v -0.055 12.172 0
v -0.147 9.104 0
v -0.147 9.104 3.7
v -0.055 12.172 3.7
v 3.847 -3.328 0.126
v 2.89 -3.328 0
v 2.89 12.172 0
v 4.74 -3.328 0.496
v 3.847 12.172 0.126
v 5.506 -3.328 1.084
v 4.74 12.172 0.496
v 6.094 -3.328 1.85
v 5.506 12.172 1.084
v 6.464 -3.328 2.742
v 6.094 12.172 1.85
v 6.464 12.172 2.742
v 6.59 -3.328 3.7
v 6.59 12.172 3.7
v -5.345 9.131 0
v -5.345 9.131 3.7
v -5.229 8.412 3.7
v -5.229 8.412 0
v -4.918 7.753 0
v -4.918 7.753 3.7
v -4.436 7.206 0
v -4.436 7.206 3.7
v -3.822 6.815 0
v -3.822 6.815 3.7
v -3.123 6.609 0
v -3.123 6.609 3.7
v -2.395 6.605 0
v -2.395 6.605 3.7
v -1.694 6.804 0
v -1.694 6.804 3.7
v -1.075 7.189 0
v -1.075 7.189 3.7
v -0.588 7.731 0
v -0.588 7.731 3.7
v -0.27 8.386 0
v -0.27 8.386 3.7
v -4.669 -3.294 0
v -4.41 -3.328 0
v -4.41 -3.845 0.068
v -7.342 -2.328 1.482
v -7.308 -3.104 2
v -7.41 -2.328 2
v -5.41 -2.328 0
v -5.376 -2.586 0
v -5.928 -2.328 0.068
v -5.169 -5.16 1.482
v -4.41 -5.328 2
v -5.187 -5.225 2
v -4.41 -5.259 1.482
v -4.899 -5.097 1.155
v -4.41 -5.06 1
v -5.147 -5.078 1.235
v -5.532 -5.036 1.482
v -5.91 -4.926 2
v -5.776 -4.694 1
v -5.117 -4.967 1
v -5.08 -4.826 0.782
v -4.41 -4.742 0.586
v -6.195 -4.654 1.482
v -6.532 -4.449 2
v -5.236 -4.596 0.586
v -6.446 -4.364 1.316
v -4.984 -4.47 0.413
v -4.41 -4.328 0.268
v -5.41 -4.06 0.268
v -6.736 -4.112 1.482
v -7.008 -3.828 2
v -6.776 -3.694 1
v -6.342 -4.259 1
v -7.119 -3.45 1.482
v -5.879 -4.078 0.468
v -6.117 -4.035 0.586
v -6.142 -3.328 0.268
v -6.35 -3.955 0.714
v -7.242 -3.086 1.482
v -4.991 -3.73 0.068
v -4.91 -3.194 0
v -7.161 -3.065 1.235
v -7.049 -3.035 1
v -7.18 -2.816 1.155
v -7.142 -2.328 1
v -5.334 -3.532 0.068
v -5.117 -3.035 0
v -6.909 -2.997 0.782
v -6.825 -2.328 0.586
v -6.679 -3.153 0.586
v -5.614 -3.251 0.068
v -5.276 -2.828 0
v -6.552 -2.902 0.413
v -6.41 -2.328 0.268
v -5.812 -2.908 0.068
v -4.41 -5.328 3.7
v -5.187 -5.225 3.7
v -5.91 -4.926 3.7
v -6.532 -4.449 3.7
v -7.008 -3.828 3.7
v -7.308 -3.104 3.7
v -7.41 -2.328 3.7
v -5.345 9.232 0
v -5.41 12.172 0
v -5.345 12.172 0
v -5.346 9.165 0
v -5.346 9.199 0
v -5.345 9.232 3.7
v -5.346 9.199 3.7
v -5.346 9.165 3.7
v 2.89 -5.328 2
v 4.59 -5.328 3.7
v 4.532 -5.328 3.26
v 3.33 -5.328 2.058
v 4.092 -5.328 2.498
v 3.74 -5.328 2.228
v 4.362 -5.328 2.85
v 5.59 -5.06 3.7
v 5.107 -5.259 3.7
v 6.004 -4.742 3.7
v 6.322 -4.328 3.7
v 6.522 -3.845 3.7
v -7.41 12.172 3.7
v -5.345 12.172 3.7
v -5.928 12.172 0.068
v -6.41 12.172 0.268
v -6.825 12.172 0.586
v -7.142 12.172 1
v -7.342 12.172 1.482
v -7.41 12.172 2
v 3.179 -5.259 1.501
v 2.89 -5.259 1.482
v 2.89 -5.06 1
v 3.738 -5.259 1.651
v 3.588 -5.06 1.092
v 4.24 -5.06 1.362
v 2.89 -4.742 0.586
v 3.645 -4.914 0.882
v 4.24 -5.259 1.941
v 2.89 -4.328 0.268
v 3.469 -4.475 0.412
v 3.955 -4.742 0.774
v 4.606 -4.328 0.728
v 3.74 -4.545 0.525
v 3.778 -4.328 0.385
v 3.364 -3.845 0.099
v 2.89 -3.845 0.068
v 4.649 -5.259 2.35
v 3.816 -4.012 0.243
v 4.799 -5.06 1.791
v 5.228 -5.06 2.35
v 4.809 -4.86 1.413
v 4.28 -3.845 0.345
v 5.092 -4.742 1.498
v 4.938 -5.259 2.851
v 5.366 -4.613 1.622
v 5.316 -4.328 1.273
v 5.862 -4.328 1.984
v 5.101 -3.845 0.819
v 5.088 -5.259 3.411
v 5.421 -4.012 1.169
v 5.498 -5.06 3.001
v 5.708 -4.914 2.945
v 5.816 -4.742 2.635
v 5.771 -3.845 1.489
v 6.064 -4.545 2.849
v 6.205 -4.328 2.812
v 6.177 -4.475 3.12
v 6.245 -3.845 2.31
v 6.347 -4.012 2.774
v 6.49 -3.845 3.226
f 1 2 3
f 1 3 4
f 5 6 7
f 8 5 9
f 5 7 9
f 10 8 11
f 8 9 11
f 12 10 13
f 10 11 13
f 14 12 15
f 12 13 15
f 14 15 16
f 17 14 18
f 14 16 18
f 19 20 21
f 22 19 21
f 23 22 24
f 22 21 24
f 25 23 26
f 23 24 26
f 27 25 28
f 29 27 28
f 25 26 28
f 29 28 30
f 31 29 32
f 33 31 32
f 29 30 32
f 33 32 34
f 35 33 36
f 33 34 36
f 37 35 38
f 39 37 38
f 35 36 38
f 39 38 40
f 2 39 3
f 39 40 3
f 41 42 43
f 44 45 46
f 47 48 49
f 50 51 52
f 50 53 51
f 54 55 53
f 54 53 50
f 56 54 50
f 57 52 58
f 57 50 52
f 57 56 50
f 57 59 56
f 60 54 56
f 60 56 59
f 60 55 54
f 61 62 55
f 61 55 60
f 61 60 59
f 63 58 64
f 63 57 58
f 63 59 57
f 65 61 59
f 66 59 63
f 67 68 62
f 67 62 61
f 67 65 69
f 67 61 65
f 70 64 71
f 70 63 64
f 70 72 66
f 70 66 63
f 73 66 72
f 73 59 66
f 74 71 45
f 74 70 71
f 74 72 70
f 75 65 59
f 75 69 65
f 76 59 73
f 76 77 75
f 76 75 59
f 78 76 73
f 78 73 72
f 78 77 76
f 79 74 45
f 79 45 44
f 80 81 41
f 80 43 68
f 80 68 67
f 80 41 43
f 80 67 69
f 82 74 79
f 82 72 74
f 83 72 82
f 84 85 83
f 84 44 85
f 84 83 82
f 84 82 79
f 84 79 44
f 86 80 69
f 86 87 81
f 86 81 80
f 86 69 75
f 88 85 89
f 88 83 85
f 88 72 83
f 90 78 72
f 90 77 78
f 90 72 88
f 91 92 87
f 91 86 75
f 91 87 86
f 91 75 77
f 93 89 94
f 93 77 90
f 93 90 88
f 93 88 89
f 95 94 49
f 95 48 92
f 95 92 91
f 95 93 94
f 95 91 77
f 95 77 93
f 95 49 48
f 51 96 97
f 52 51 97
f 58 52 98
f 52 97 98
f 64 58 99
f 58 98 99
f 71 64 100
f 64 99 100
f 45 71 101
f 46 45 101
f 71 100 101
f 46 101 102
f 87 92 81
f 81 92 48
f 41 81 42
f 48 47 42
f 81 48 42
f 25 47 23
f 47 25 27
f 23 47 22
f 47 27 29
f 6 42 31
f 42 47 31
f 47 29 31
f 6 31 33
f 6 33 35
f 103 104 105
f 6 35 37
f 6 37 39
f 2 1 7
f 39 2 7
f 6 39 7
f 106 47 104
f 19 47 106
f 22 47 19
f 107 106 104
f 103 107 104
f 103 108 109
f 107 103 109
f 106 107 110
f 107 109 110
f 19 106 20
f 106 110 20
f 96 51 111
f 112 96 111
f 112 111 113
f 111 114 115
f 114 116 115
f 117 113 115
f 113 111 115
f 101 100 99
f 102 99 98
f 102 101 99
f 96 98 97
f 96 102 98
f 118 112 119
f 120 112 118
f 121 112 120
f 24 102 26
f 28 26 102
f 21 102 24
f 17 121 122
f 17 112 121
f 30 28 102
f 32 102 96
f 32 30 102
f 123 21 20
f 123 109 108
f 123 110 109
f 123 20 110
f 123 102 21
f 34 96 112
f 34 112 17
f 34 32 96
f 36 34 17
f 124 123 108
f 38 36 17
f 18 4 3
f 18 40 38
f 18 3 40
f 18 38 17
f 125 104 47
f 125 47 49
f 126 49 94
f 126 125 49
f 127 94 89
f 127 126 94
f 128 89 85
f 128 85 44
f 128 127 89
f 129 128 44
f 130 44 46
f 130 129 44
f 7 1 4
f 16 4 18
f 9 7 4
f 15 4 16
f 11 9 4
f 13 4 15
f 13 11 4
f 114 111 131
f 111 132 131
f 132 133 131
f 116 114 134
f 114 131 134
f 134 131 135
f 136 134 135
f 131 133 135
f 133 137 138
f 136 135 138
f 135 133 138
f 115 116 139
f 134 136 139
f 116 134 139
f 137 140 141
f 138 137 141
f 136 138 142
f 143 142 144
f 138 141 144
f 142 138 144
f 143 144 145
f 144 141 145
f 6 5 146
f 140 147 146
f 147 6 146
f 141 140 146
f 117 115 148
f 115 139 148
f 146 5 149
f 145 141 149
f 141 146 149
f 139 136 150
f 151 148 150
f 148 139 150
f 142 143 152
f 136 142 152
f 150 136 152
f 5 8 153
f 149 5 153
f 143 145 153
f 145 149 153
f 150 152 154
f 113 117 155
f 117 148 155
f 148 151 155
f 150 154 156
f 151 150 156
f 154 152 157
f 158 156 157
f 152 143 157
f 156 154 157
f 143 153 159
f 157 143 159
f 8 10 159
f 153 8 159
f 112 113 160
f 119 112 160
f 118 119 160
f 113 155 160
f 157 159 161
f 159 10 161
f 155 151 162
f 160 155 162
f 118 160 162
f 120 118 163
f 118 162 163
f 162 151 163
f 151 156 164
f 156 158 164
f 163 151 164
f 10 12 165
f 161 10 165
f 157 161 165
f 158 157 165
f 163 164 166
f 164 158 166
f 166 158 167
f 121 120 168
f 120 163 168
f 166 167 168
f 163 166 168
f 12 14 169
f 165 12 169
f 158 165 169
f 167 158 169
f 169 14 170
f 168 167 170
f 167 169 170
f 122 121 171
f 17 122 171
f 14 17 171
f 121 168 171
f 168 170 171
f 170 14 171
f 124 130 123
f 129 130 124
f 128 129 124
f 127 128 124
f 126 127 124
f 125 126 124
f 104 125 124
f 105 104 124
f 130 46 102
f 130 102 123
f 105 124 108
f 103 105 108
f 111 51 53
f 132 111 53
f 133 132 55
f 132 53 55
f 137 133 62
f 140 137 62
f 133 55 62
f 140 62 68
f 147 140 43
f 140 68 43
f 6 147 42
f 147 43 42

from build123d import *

# Parameters (mm, degrees)
F0_W         = 14
F0_H         = 17.5
F1_DEPTH     = 3.7
F3_DEPTH     = 5.4
F4_R         = 3.69999
F5_R         = 3
F6_T1_DEPTH  = 7.30001
F6_T3_DEPTH  = 5.00001
F6_T5_DEPTH  = 19.5
F6_T8_ANGLE  = 90
F6_T10_ANGLE = 90


# Not quite as in the source:
# - a fillet or chamfer that OpenCascade refuses, or shapes differently, is made with other operations: its cross-section is extruded or revolved along the edge and cut away or added
# - a fillet or chamfer is up to 0.001 mm smaller than in the source, because OpenCascade refuses the exact size


with BuildPart() as f1:
    # F0 (on Top) → F1 (new body)
    with BuildSketch(Plane.XY):
        with Locations((-0.4103374667, 3.4223956802)):
            Rectangle(F0_W, F0_H)
    extrude(amount=F1_DEPTH)

    # F2 (on face) → F3 (cut)
    with BuildSketch(Plane.XY.offset(3.7)):
        with BuildLine():
            Line((-5.3451164257, 9.1307080224), (-5.3451164257, 9.2324278445))
            ThreePointArc((-5.3451164257, 9.2324278445), (-5.3456139214, 9.1815679334), (-5.3451164257, 9.1307080224))
        make_face()
        with BuildLine():
            Line((-5.3451164257, 12.1723956802), (-5.3451164257, 9.2324278445))
            Line((-5.3451164257, 9.2324278445), (-5.3451164257, 9.1307080224))
            ThreePointArc((-5.3451164257, 9.1307080224), (-2.7588797704, 6.5816017765), (-0.1467657558, 9.1041843944))
            Line((-0.1467657558, 9.1041843944), (-0.055406418, 12.1723956802))
            Line((-0.055406418, 12.1723956802), (-5.3451164257, 12.1723956802))
        make_face()
    extrude(amount=-F3_DEPTH, mode=Mode.SUBTRACT)

    # F4 (radius 3.7 in the source; OpenCascade refuses exactly that, so slightly less here)
    f4_edges = [f1.edges().sort_by_distance(p)[0] for p in [
        (6.589663, 3.422396, 0),
    ]]
    fillet(f4_edges, radius=F4_R)

    # F5
    f5_edges = [f1.edges().sort_by_distance(p)[0] for p in [
        (-7.410337, -5.327604, 1.85),
    ]]
    fillet(f5_edges, radius=F5_R)

    # F6: fillet of radius 2 on 1 edges, made by hand

    # F6_s2 → F6_t1 (cut)
    with BuildSketch(Plane.YZ.offset(-4.4103374667)):
        with BuildLine():
            ThreePointArc((-5.3276043198, 2), (-4.7418178821, 0.5857864376), (-3.3276043198, 0))
            Line((-3.3276043198, 0), (-5.3276043198, 0))
            Line((-5.3276043198, 0), (-5.3276043198, 2))
        make_face()
    extrude(amount=F6_T1_DEPTH, mode=Mode.SUBTRACT)

    # F6_s4 → F6_t3 (cut)
    with BuildSketch(Plane.XY.offset(3.69999)):
        with BuildLine():
            ThreePointArc((4.5896625333, -5.3276043198), (6.0038760956, -4.7418178821), (6.5896625333, -3.3276043198))
            Line((6.5896625333, -3.3276043198), (6.5896625333, -5.3276043198))
            Line((6.5896625333, -5.3276043198), (4.5896625333, -5.3276043198))
        make_face()
    extrude(amount=F6_T3_DEPTH, mode=Mode.SUBTRACT)

    # F6_s6 → F6_t5 (cut)
    with BuildSketch(Plane.XZ.offset(-17.1723956802)):
        with BuildLine():
            ThreePointArc((-5.4103374667, 0), (-6.8245510291, 0.5857864376), (-7.4103374667, 2))
            Line((-7.4103374667, 2), (-7.4103374667, 0))
            Line((-7.4103374667, 0), (-5.4103374667, 0))
        make_face()
    extrude(amount=F6_T5_DEPTH, mode=Mode.SUBTRACT)

    # F6_s7 → F6_t8 (revolve, cut)
    with BuildSketch(Plane.YZ.offset(2.8896725333)):
        with BuildLine():
            ThreePointArc((-5.3276043198, 2), (-4.7418178821, 0.5857864376), (-3.3276043198, 0))
            Line((-3.3276043198, 0), (-5.3276043198, 0))
            Line((-5.3276043198, 0), (-5.3276043198, 2))
        make_face()
    revolve(axis=Axis((2.8896725333, -5.3276043198, 3.69999), (0, -1, 0)), revolution_arc=F6_T8_ANGLE, mode=Mode.SUBTRACT)

    # F6_s9 → F6_t10 (revolve, cut)
    with BuildSketch(Plane.YZ.offset(-4.4103374667)):
        with BuildLine():
            ThreePointArc((-5.3276043198, 2), (-4.7418178821, 0.5857864376), (-3.3276043198, 0))
            Line((-3.3276043198, 0), (-5.3276043198, 0))
            Line((-5.3276043198, 0), (-5.3276043198, 2))
        make_face()
    revolve(axis=Axis((-4.4103374667, -2.3276043198, 0), (0, 0, -1)), revolution_arc=F6_T10_ANGLE, mode=Mode.SUBTRACT)


solid = f1.part
